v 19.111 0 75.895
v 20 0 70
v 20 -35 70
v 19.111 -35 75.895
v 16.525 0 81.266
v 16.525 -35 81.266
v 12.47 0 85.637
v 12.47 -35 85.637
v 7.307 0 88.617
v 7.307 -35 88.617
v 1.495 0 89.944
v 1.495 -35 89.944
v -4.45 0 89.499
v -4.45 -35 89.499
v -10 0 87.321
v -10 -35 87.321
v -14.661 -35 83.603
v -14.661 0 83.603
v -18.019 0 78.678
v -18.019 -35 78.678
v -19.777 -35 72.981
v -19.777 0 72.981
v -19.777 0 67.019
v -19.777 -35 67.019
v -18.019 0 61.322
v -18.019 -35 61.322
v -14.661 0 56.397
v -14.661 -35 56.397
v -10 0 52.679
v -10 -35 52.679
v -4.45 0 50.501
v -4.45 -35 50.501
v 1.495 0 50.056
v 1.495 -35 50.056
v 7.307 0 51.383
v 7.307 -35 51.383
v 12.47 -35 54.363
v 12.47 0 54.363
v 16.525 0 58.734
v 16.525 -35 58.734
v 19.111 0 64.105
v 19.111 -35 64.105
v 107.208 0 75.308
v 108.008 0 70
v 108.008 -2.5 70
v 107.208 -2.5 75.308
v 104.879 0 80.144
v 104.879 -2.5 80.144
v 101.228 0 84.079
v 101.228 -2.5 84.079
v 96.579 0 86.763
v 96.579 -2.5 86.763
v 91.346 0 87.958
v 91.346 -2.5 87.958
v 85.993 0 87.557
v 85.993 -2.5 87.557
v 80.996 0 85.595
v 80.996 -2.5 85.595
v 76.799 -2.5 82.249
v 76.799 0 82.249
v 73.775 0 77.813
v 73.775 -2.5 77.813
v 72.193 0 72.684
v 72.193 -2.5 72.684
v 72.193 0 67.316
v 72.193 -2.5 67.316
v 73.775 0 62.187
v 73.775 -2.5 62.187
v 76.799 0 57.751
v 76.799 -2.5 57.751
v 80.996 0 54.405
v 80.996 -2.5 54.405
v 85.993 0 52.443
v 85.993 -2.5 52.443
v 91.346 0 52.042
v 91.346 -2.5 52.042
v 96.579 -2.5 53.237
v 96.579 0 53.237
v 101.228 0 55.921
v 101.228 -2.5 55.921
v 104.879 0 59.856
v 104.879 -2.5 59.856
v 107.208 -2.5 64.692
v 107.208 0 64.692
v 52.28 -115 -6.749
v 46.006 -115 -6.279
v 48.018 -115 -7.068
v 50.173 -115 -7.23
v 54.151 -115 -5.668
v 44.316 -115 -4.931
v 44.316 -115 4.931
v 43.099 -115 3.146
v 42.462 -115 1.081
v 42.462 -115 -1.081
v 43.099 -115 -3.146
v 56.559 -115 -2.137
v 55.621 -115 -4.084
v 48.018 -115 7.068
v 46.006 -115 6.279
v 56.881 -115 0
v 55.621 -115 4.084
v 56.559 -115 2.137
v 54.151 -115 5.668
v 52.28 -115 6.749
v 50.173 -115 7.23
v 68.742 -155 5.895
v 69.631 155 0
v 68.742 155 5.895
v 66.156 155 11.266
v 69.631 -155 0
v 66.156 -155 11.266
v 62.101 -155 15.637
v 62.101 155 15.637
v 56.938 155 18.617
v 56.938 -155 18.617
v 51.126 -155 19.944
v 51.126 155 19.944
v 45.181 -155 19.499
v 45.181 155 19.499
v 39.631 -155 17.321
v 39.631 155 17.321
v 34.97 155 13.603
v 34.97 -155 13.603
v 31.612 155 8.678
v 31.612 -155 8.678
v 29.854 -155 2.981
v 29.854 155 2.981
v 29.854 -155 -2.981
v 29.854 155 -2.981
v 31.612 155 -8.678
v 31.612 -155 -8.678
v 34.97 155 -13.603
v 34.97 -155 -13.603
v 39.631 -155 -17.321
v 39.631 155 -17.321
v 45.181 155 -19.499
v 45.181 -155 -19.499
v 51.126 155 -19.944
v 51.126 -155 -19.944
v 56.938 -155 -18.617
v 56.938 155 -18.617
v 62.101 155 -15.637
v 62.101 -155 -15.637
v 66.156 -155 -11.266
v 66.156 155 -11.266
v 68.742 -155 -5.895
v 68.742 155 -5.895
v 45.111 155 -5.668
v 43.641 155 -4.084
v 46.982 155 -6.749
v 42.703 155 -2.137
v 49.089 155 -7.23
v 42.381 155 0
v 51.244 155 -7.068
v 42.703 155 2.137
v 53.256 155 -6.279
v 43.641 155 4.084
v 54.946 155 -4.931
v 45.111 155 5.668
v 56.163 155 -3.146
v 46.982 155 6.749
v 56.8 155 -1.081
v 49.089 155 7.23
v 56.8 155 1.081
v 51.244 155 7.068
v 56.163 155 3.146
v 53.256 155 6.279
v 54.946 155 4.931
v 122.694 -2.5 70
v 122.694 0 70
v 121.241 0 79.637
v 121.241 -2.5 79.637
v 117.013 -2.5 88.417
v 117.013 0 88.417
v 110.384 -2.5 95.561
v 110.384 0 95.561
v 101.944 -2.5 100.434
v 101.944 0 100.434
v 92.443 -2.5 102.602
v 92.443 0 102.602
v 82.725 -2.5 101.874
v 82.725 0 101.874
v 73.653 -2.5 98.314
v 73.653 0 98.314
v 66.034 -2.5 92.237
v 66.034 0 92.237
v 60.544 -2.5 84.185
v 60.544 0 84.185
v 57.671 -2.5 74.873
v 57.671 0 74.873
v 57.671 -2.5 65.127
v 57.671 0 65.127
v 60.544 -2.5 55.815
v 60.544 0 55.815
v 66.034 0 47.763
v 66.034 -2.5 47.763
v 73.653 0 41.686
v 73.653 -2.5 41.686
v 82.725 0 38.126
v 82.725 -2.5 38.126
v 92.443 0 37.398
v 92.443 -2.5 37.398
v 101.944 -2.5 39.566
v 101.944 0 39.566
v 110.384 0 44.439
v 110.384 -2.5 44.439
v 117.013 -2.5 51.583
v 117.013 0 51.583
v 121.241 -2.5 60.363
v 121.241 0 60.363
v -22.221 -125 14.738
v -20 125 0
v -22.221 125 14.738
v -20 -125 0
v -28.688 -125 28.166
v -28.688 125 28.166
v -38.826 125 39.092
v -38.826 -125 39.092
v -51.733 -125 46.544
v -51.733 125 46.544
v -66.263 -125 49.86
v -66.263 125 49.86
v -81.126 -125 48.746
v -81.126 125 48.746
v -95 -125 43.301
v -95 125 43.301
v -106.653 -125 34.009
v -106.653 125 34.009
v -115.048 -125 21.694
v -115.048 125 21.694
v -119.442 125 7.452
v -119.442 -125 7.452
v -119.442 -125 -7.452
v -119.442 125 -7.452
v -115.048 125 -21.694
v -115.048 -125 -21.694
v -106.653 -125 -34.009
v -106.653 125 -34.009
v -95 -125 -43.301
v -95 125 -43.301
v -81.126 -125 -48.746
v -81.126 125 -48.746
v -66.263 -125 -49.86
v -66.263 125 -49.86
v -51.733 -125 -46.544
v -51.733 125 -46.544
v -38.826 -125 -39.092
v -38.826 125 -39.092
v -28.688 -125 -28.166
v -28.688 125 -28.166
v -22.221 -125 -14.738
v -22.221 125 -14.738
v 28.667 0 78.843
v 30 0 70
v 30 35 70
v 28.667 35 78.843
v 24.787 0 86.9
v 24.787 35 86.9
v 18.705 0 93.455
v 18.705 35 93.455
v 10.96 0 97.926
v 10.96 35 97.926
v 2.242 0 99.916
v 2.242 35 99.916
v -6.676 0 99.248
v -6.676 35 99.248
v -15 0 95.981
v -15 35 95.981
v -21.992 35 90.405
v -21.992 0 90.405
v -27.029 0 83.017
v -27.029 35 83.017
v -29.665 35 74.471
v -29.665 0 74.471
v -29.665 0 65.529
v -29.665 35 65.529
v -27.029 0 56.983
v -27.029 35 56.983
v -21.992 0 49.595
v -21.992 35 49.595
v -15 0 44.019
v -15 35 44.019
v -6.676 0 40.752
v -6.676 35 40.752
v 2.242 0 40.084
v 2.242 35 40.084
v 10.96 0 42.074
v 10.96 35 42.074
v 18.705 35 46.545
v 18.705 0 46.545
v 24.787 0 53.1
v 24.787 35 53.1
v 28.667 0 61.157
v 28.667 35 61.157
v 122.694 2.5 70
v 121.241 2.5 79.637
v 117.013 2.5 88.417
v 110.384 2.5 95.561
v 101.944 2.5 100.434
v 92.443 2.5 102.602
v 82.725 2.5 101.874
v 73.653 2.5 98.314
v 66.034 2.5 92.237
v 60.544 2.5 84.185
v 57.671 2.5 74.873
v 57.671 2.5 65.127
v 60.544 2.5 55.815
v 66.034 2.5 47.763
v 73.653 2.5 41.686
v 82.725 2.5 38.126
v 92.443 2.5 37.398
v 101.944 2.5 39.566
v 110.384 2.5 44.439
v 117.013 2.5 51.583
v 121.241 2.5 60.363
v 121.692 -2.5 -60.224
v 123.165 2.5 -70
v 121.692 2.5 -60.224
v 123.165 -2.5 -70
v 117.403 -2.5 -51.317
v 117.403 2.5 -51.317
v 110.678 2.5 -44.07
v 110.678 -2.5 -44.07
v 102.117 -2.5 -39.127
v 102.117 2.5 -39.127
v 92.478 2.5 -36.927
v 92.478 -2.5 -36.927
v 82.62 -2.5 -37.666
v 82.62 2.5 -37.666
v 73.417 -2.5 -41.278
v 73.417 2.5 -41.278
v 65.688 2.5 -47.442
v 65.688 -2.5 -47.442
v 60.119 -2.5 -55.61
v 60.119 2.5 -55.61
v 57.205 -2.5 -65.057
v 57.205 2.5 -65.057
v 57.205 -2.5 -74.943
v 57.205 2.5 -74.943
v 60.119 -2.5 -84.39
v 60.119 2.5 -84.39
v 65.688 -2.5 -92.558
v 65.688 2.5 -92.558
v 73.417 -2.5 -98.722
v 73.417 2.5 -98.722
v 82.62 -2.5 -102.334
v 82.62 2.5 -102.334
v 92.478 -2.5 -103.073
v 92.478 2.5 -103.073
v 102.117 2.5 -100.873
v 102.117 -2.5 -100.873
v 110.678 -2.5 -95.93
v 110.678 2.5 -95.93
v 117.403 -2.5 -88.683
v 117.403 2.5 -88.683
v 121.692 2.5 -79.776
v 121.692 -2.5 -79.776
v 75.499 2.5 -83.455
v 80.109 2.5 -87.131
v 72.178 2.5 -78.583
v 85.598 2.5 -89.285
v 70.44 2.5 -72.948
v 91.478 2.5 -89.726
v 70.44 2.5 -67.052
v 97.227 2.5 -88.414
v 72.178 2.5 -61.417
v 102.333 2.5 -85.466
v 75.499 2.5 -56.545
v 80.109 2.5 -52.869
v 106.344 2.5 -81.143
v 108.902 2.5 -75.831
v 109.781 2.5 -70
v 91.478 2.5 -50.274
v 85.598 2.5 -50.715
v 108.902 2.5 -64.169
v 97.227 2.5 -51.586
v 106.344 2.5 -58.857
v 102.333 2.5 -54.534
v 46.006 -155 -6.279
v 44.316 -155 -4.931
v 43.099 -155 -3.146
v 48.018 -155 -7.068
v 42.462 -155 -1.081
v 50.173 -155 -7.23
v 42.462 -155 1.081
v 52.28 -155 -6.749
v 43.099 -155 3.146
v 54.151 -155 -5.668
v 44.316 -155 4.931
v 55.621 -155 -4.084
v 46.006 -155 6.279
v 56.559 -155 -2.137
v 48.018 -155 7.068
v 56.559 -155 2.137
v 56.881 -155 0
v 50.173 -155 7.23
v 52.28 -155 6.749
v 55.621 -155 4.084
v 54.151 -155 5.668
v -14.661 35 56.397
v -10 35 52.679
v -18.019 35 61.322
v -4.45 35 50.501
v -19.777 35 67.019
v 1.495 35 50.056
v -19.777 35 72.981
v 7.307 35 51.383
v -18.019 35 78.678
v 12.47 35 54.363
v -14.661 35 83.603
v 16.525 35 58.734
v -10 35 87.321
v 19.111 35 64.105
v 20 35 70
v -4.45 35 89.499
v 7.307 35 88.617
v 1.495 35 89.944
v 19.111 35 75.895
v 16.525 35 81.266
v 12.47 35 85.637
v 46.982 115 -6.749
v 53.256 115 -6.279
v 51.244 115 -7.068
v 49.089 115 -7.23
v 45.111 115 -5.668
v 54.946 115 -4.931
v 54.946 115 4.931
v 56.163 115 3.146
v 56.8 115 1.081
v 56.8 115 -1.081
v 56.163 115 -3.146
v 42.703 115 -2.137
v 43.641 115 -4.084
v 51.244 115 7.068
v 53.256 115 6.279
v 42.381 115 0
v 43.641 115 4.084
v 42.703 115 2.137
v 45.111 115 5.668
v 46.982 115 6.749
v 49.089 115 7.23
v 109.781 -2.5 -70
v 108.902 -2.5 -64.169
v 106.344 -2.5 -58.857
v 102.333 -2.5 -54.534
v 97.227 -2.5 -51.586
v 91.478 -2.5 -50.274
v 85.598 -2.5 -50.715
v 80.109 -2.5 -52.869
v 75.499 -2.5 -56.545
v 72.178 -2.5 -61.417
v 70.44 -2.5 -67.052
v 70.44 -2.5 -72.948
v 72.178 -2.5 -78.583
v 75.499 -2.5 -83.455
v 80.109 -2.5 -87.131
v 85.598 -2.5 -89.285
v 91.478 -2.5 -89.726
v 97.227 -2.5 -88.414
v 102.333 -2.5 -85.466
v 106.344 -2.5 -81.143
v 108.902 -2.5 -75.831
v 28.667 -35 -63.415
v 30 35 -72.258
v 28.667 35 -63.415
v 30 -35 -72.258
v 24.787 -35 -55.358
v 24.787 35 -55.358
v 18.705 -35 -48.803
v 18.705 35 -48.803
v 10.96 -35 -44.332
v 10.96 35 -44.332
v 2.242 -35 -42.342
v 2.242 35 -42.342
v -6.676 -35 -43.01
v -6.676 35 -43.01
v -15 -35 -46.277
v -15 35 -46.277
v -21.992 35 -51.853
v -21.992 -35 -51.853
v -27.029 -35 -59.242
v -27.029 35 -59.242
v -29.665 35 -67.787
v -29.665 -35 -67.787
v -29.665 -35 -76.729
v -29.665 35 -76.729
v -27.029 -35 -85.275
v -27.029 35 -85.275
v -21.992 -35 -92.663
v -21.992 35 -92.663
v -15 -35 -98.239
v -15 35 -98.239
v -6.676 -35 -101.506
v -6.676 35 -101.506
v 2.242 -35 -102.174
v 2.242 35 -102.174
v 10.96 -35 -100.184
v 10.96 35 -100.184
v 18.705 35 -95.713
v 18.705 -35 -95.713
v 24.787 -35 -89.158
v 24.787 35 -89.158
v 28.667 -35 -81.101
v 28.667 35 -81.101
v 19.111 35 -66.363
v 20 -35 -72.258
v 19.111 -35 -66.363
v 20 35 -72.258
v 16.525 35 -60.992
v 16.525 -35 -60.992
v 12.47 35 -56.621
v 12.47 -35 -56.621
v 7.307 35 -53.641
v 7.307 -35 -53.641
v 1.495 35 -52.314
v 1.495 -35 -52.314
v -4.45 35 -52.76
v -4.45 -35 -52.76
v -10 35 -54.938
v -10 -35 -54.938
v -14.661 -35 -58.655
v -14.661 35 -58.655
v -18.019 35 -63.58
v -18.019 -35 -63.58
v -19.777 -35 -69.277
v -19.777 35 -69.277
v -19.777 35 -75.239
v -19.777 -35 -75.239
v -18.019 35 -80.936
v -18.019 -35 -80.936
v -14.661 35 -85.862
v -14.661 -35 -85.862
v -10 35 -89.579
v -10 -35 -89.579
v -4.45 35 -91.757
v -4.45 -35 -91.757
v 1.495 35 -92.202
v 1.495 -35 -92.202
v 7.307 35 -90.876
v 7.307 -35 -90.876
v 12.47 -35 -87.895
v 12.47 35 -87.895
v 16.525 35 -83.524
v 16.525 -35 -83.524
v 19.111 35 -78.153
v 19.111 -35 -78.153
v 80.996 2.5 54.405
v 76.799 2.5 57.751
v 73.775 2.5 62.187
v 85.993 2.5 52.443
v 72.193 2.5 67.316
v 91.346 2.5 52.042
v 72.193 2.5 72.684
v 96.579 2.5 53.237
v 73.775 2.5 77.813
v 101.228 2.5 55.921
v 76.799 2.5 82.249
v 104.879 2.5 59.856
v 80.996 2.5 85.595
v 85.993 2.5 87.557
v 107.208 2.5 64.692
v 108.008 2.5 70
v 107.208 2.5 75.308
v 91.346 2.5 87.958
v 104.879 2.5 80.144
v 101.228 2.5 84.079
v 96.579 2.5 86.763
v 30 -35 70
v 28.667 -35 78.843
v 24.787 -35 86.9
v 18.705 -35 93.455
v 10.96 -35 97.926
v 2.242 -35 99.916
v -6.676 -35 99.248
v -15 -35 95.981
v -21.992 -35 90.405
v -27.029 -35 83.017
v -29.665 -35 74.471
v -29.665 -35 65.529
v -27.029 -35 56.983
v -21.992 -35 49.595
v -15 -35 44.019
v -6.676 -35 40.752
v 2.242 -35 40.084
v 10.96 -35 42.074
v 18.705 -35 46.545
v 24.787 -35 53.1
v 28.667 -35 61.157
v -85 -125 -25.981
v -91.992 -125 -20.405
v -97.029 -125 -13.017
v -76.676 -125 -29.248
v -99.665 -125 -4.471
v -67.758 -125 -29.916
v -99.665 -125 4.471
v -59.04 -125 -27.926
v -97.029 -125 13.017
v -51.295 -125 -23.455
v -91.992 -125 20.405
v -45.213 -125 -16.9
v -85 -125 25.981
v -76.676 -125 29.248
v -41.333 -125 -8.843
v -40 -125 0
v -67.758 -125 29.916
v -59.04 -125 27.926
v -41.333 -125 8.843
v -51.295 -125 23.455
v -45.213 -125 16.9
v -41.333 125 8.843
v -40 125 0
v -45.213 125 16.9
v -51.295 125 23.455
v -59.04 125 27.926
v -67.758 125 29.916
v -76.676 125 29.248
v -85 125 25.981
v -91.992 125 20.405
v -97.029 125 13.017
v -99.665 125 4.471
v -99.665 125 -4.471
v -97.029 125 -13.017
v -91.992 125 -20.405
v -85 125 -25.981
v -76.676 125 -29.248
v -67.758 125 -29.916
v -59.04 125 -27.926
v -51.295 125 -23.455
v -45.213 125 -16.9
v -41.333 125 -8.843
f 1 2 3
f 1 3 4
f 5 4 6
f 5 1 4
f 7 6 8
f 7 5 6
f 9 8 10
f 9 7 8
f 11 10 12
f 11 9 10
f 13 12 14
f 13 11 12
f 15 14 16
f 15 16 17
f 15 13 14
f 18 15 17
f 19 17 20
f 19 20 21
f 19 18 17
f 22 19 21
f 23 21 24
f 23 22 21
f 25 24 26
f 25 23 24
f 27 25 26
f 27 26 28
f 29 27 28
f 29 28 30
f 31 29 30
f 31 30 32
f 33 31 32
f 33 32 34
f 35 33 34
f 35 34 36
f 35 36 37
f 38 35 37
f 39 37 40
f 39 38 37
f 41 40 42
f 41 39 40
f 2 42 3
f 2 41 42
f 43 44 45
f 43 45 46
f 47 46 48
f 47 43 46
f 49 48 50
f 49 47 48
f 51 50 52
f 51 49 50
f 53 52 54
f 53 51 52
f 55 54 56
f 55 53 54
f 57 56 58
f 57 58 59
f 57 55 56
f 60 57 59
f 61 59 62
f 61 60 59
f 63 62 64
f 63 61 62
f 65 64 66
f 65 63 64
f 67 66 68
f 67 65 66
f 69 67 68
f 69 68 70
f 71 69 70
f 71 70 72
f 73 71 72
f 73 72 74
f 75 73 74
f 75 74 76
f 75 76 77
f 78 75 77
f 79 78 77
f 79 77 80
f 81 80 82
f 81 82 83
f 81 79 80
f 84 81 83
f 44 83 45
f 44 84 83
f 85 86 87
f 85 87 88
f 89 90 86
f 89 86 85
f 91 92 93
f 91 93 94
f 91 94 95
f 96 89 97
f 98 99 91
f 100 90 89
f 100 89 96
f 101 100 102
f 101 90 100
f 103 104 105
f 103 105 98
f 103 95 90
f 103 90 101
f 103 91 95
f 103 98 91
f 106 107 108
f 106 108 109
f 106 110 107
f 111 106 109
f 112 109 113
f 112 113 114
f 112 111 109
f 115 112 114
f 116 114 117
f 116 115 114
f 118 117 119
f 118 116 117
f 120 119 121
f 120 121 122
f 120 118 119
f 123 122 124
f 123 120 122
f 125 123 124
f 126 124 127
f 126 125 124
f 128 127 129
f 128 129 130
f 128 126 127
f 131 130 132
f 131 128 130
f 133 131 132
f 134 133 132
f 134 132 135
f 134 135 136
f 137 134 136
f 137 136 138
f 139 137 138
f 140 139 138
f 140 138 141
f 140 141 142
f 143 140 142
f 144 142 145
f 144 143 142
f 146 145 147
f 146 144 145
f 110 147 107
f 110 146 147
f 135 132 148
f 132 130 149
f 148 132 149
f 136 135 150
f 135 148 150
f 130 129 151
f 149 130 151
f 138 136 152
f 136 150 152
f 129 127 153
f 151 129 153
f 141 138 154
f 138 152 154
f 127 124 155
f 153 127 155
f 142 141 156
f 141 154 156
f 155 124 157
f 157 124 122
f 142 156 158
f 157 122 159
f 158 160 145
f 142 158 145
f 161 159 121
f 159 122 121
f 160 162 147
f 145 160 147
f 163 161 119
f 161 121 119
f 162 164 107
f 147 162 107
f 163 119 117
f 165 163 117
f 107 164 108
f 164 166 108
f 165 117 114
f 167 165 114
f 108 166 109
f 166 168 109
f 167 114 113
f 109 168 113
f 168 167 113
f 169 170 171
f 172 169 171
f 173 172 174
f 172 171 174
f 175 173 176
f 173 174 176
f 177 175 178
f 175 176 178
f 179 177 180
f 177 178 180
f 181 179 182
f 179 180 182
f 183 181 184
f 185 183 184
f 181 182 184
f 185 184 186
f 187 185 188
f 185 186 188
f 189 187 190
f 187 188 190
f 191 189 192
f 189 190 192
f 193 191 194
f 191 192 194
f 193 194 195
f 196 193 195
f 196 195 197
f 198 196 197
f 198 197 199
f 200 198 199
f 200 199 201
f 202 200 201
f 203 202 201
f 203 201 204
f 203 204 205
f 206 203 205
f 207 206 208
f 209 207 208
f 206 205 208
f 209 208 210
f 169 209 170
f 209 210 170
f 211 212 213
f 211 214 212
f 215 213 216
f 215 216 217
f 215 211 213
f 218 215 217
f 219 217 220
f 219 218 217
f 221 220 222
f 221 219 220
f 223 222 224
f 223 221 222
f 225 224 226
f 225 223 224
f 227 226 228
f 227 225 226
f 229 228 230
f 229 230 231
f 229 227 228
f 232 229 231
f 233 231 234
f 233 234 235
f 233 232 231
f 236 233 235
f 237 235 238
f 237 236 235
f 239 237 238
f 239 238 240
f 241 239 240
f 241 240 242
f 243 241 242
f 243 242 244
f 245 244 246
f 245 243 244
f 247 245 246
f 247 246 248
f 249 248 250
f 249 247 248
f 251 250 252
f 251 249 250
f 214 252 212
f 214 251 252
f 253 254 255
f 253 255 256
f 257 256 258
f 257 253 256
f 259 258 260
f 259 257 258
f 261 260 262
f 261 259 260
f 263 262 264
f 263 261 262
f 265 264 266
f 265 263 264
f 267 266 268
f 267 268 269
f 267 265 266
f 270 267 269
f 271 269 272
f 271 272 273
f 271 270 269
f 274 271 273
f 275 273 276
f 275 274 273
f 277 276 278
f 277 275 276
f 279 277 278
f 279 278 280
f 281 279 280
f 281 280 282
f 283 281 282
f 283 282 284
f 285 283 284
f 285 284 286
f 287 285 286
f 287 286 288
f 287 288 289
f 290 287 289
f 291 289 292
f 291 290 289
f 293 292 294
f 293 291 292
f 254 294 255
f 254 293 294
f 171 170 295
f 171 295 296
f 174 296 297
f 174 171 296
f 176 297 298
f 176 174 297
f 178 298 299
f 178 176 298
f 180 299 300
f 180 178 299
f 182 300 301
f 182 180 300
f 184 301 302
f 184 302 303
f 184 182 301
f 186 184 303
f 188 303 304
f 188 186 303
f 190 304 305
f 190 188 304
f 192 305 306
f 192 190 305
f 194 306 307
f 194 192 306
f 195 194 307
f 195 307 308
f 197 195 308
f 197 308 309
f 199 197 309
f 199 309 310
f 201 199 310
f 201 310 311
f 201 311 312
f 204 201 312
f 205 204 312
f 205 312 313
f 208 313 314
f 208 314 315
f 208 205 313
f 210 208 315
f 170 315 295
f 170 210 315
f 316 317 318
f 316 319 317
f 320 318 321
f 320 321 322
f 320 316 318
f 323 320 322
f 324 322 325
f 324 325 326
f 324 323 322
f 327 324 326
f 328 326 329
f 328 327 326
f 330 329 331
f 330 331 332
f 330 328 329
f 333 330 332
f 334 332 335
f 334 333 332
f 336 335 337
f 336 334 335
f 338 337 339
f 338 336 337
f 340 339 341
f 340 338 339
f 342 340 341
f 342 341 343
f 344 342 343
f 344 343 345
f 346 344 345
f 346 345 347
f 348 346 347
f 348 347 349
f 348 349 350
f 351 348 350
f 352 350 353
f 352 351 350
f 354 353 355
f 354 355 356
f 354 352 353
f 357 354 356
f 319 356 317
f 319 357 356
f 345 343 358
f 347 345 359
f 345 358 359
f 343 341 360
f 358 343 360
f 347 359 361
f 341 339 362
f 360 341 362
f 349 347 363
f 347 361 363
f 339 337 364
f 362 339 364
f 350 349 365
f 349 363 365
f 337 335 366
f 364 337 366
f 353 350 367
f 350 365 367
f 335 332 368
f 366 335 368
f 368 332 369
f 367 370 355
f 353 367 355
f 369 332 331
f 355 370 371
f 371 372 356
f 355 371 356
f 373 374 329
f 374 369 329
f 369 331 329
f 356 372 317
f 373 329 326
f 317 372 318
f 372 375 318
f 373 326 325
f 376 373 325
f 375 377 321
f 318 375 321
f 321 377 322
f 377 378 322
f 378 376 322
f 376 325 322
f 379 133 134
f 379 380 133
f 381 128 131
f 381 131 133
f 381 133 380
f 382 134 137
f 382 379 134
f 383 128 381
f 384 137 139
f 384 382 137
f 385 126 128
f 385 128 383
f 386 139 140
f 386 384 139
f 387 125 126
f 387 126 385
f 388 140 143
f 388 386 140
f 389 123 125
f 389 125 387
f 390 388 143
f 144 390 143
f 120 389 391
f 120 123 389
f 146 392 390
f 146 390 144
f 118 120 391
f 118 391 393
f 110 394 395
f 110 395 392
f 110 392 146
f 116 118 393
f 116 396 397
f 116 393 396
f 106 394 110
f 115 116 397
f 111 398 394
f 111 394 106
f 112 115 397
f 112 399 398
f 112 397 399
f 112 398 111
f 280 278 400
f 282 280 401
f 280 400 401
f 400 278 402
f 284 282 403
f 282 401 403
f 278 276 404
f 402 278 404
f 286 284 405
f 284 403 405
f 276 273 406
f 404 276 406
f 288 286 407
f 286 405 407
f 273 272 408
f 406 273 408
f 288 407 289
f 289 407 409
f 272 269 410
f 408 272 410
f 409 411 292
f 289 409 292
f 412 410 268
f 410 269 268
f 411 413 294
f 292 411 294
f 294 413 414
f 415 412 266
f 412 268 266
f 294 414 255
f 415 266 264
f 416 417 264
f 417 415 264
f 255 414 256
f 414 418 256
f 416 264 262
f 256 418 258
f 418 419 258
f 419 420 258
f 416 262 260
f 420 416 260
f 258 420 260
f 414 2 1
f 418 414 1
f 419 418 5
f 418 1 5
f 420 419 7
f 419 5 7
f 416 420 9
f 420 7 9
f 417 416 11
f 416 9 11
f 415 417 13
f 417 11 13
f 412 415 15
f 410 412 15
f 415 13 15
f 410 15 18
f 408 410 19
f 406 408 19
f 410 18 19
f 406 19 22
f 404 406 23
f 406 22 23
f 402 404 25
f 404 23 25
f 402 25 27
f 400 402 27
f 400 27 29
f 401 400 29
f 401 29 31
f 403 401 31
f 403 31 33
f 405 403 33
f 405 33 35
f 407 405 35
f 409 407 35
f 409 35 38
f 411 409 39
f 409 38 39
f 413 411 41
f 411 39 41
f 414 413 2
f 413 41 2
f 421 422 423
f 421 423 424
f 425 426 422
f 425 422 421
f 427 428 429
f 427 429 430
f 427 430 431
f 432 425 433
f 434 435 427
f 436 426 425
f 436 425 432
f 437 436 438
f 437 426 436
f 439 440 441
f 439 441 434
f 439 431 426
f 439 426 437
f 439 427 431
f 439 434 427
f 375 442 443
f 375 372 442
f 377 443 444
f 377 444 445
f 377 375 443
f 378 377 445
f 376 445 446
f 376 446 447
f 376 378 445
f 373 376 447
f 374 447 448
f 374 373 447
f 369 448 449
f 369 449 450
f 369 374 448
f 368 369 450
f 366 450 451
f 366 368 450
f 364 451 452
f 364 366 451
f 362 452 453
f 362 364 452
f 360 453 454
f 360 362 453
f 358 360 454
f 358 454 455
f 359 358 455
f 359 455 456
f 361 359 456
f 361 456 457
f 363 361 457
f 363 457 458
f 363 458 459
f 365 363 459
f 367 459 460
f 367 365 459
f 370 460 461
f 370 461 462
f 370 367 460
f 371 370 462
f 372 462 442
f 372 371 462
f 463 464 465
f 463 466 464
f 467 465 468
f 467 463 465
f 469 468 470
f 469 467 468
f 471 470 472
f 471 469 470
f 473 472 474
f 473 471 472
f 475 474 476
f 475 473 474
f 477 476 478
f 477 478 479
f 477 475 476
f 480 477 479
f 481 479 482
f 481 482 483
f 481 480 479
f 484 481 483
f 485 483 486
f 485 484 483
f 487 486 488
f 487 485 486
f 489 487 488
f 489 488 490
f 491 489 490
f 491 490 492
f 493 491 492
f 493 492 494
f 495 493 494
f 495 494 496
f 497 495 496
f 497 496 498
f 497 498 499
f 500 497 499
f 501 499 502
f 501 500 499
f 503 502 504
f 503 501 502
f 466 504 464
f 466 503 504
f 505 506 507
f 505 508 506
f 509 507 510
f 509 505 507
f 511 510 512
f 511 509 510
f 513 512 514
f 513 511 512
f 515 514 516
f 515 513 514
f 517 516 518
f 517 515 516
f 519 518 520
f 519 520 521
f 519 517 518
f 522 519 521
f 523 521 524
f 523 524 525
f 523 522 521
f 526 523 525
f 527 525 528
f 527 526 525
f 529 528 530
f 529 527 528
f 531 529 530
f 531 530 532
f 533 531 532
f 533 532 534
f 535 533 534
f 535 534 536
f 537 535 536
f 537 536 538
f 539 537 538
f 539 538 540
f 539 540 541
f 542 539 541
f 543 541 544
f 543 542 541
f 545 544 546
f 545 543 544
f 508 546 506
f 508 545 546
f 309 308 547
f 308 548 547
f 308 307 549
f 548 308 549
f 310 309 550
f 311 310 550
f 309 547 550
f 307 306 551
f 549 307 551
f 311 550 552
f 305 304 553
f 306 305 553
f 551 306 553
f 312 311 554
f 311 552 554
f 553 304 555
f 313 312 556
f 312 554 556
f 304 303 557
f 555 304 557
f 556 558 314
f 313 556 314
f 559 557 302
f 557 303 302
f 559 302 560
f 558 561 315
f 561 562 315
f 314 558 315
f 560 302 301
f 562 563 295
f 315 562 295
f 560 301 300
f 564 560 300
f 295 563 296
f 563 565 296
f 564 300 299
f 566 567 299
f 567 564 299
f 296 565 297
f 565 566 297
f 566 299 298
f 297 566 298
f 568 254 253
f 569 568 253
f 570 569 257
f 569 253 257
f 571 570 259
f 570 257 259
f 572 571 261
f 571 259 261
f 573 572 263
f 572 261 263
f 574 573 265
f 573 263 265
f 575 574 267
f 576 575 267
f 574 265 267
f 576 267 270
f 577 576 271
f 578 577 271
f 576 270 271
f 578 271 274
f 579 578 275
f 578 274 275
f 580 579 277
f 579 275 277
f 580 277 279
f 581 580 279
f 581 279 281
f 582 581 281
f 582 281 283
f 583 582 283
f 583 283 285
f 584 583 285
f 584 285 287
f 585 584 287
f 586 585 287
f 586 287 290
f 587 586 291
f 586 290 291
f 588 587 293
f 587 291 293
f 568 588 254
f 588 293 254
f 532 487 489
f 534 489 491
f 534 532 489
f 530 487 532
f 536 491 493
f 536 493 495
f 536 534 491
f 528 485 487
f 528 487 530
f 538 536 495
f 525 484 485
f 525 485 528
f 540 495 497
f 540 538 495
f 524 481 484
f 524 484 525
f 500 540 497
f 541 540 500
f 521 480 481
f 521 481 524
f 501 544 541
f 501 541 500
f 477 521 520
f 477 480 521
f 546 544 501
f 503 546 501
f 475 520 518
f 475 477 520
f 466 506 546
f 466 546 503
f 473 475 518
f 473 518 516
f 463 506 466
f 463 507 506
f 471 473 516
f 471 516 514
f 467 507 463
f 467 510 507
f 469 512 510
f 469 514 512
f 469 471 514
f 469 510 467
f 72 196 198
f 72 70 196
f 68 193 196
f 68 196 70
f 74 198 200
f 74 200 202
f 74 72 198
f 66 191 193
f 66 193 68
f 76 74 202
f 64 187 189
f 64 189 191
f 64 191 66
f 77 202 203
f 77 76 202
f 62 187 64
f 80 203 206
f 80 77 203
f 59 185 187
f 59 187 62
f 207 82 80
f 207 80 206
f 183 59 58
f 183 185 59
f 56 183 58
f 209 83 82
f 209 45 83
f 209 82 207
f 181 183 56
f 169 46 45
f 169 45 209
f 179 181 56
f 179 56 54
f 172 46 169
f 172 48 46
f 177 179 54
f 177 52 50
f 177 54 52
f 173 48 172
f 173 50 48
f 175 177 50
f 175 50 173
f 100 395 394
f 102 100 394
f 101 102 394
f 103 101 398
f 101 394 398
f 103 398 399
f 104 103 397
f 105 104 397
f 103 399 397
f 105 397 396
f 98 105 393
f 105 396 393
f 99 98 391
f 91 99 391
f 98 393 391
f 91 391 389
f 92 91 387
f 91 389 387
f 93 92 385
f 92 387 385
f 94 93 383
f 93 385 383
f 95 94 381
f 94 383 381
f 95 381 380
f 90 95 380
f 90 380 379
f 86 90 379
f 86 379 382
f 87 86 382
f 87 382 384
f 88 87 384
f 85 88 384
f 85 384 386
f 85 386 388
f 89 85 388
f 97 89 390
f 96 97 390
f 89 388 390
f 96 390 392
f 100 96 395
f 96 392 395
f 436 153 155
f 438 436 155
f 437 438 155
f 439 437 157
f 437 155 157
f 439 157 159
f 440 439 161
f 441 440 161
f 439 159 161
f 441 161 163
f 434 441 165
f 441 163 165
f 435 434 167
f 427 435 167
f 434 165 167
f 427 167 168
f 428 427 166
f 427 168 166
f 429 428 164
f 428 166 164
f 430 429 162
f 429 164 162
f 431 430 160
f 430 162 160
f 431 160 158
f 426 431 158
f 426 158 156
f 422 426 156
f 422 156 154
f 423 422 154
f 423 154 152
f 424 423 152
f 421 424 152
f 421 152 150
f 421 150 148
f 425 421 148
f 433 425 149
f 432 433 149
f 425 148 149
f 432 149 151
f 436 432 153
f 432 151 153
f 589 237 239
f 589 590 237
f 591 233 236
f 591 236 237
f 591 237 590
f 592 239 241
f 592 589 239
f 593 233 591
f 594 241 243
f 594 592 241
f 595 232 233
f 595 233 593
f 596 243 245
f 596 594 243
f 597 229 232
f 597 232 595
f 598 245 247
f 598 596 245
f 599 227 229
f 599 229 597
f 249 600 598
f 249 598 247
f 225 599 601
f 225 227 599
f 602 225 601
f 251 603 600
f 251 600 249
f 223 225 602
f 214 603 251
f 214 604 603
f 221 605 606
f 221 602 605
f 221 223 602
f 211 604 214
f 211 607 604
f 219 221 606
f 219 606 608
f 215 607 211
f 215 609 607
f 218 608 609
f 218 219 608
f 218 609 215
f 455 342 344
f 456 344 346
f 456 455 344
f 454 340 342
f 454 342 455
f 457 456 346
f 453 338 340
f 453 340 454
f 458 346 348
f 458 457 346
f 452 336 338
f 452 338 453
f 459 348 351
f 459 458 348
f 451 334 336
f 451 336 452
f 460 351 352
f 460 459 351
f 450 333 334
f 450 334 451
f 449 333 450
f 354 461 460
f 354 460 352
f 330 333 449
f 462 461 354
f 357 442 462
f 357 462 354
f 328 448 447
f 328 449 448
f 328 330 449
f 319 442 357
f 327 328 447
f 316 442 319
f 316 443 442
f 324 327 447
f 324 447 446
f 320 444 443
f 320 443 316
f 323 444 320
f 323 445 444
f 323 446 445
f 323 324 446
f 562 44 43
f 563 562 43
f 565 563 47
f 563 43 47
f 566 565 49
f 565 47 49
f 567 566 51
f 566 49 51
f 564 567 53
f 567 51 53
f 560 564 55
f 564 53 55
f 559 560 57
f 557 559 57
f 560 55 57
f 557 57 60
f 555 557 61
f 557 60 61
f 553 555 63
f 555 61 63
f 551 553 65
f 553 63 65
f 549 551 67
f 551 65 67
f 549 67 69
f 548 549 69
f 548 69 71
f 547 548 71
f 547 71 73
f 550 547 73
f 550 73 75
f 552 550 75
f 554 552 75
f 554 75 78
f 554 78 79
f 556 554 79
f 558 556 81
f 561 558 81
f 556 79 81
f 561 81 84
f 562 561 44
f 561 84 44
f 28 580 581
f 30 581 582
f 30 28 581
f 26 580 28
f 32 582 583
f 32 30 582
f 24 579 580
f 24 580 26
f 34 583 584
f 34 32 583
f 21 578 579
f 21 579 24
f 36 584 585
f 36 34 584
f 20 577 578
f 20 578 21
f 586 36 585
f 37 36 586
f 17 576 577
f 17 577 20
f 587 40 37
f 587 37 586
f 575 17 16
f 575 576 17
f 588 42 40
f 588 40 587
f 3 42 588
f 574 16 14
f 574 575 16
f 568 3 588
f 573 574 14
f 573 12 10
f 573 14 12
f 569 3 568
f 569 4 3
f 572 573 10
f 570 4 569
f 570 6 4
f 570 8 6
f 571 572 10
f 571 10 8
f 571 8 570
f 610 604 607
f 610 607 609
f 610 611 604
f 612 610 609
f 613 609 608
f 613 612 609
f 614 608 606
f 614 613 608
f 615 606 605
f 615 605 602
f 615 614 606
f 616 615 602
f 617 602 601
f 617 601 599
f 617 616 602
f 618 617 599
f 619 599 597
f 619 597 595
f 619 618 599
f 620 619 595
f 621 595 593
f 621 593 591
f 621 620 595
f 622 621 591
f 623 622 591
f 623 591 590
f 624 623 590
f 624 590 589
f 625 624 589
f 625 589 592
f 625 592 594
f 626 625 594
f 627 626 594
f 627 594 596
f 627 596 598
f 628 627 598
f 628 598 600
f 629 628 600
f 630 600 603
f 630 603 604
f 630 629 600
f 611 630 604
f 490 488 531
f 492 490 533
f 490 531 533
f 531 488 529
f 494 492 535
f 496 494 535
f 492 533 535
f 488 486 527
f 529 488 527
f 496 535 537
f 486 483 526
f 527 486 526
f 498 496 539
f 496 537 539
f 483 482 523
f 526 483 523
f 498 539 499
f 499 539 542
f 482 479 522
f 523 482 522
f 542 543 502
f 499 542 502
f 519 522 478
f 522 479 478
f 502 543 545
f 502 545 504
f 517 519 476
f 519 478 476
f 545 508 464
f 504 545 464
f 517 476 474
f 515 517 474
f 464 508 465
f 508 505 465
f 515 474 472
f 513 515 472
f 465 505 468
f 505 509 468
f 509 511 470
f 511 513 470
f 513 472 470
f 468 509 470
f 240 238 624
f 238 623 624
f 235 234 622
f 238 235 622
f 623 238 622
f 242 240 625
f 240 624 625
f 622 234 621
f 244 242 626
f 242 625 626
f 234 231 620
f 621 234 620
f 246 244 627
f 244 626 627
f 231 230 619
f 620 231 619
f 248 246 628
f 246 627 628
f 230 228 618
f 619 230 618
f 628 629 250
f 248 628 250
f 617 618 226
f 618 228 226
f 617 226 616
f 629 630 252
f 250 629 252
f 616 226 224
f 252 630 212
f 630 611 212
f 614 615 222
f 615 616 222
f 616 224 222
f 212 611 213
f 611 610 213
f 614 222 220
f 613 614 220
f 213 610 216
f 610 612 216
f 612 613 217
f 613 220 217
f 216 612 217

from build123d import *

# Parameters (mm, degrees)
F0_R      = 50
F0_R_2    = 30
F1_DEPTH  = 125
F2_R      = 30
F2_R_2    = 20
F3_DEPTH  = 35
F4_R      = 32.693703
F4_R_2    = 18.008062
F4_R_3    = 33.165405
F4_R_4    = 19.78123
F5_DEPTH  = 2.5
F6_R      = 20
F7_DEPTH  = 155
F8_R      = 7.25
F9_DEPTH  = 40
F10_R     = 7.25
F11_DEPTH = 40


with BuildPart() as f1:
    # F0 (on Front) → F1 (new body, symmetric)
    with BuildSketch(Plane.XZ):
        with Locations((-70, 0)):
            Circle(F0_R)
        with Locations((-70, 0)):
            Circle(F0_R_2, mode=Mode.SUBTRACT)
    extrude(amount=F1_DEPTH, both=True)


with BuildPart() as f3:
    # F2 (on Front) → F3 (new body, symmetric)
    with BuildSketch(Plane.XZ):
        with Locations((0, 70)):
            Circle(F2_R)
        with Locations((0, 70)):
            Circle(F2_R_2, mode=Mode.SUBTRACT)
        with Locations((0, -72.258064)):
            Circle(F2_R)
        with Locations((0, -72.258064)):
            Circle(F2_R_2, mode=Mode.SUBTRACT)
    extrude(amount=F3_DEPTH, both=True)


with BuildPart() as f5:
    # F4 (on Front) → F5 (new body, symmetric)
    with BuildSketch(Plane.XZ):
        with Locations((90, 70)):
            Circle(F4_R)
        with Locations((90, 70)):
            Circle(F4_R_2, mode=Mode.SUBTRACT)
        with Locations((90, -70)):
            Circle(F4_R_3)
        with Locations((90, -70)):
            Circle(F4_R_4, mode=Mode.SUBTRACT)
    extrude(amount=F5_DEPTH, both=True)


with BuildPart() as f7:
    # F6 (on Front) → F7 (new body, symmetric)
    with BuildSketch(Plane.XZ):
        with Locations((49.630965, 0)):
            Circle(F6_R)
    extrude(amount=F7_DEPTH, both=True)

    # F8 (on face) → F9 (cut)
    with BuildSketch(Plane.XZ.offset(155)):
        with Locations((49.630965, 0)):
            Circle(F8_R)
    extrude(amount=-F9_DEPTH, mode=Mode.SUBTRACT)

    # F10 (on face) → F11 (cut)
    with BuildSketch(Plane(origin=(0, 155, 0), x_dir=(-1, 0, 0), z_dir=(0, 1, 0))):
        with Locations((-49.630965, 0)):
            Circle(F10_R)
    extrude(amount=-F11_DEPTH, mode=Mode.SUBTRACT)


solid = Compound([f1.part, f3.part, f5.part, f7.part])
